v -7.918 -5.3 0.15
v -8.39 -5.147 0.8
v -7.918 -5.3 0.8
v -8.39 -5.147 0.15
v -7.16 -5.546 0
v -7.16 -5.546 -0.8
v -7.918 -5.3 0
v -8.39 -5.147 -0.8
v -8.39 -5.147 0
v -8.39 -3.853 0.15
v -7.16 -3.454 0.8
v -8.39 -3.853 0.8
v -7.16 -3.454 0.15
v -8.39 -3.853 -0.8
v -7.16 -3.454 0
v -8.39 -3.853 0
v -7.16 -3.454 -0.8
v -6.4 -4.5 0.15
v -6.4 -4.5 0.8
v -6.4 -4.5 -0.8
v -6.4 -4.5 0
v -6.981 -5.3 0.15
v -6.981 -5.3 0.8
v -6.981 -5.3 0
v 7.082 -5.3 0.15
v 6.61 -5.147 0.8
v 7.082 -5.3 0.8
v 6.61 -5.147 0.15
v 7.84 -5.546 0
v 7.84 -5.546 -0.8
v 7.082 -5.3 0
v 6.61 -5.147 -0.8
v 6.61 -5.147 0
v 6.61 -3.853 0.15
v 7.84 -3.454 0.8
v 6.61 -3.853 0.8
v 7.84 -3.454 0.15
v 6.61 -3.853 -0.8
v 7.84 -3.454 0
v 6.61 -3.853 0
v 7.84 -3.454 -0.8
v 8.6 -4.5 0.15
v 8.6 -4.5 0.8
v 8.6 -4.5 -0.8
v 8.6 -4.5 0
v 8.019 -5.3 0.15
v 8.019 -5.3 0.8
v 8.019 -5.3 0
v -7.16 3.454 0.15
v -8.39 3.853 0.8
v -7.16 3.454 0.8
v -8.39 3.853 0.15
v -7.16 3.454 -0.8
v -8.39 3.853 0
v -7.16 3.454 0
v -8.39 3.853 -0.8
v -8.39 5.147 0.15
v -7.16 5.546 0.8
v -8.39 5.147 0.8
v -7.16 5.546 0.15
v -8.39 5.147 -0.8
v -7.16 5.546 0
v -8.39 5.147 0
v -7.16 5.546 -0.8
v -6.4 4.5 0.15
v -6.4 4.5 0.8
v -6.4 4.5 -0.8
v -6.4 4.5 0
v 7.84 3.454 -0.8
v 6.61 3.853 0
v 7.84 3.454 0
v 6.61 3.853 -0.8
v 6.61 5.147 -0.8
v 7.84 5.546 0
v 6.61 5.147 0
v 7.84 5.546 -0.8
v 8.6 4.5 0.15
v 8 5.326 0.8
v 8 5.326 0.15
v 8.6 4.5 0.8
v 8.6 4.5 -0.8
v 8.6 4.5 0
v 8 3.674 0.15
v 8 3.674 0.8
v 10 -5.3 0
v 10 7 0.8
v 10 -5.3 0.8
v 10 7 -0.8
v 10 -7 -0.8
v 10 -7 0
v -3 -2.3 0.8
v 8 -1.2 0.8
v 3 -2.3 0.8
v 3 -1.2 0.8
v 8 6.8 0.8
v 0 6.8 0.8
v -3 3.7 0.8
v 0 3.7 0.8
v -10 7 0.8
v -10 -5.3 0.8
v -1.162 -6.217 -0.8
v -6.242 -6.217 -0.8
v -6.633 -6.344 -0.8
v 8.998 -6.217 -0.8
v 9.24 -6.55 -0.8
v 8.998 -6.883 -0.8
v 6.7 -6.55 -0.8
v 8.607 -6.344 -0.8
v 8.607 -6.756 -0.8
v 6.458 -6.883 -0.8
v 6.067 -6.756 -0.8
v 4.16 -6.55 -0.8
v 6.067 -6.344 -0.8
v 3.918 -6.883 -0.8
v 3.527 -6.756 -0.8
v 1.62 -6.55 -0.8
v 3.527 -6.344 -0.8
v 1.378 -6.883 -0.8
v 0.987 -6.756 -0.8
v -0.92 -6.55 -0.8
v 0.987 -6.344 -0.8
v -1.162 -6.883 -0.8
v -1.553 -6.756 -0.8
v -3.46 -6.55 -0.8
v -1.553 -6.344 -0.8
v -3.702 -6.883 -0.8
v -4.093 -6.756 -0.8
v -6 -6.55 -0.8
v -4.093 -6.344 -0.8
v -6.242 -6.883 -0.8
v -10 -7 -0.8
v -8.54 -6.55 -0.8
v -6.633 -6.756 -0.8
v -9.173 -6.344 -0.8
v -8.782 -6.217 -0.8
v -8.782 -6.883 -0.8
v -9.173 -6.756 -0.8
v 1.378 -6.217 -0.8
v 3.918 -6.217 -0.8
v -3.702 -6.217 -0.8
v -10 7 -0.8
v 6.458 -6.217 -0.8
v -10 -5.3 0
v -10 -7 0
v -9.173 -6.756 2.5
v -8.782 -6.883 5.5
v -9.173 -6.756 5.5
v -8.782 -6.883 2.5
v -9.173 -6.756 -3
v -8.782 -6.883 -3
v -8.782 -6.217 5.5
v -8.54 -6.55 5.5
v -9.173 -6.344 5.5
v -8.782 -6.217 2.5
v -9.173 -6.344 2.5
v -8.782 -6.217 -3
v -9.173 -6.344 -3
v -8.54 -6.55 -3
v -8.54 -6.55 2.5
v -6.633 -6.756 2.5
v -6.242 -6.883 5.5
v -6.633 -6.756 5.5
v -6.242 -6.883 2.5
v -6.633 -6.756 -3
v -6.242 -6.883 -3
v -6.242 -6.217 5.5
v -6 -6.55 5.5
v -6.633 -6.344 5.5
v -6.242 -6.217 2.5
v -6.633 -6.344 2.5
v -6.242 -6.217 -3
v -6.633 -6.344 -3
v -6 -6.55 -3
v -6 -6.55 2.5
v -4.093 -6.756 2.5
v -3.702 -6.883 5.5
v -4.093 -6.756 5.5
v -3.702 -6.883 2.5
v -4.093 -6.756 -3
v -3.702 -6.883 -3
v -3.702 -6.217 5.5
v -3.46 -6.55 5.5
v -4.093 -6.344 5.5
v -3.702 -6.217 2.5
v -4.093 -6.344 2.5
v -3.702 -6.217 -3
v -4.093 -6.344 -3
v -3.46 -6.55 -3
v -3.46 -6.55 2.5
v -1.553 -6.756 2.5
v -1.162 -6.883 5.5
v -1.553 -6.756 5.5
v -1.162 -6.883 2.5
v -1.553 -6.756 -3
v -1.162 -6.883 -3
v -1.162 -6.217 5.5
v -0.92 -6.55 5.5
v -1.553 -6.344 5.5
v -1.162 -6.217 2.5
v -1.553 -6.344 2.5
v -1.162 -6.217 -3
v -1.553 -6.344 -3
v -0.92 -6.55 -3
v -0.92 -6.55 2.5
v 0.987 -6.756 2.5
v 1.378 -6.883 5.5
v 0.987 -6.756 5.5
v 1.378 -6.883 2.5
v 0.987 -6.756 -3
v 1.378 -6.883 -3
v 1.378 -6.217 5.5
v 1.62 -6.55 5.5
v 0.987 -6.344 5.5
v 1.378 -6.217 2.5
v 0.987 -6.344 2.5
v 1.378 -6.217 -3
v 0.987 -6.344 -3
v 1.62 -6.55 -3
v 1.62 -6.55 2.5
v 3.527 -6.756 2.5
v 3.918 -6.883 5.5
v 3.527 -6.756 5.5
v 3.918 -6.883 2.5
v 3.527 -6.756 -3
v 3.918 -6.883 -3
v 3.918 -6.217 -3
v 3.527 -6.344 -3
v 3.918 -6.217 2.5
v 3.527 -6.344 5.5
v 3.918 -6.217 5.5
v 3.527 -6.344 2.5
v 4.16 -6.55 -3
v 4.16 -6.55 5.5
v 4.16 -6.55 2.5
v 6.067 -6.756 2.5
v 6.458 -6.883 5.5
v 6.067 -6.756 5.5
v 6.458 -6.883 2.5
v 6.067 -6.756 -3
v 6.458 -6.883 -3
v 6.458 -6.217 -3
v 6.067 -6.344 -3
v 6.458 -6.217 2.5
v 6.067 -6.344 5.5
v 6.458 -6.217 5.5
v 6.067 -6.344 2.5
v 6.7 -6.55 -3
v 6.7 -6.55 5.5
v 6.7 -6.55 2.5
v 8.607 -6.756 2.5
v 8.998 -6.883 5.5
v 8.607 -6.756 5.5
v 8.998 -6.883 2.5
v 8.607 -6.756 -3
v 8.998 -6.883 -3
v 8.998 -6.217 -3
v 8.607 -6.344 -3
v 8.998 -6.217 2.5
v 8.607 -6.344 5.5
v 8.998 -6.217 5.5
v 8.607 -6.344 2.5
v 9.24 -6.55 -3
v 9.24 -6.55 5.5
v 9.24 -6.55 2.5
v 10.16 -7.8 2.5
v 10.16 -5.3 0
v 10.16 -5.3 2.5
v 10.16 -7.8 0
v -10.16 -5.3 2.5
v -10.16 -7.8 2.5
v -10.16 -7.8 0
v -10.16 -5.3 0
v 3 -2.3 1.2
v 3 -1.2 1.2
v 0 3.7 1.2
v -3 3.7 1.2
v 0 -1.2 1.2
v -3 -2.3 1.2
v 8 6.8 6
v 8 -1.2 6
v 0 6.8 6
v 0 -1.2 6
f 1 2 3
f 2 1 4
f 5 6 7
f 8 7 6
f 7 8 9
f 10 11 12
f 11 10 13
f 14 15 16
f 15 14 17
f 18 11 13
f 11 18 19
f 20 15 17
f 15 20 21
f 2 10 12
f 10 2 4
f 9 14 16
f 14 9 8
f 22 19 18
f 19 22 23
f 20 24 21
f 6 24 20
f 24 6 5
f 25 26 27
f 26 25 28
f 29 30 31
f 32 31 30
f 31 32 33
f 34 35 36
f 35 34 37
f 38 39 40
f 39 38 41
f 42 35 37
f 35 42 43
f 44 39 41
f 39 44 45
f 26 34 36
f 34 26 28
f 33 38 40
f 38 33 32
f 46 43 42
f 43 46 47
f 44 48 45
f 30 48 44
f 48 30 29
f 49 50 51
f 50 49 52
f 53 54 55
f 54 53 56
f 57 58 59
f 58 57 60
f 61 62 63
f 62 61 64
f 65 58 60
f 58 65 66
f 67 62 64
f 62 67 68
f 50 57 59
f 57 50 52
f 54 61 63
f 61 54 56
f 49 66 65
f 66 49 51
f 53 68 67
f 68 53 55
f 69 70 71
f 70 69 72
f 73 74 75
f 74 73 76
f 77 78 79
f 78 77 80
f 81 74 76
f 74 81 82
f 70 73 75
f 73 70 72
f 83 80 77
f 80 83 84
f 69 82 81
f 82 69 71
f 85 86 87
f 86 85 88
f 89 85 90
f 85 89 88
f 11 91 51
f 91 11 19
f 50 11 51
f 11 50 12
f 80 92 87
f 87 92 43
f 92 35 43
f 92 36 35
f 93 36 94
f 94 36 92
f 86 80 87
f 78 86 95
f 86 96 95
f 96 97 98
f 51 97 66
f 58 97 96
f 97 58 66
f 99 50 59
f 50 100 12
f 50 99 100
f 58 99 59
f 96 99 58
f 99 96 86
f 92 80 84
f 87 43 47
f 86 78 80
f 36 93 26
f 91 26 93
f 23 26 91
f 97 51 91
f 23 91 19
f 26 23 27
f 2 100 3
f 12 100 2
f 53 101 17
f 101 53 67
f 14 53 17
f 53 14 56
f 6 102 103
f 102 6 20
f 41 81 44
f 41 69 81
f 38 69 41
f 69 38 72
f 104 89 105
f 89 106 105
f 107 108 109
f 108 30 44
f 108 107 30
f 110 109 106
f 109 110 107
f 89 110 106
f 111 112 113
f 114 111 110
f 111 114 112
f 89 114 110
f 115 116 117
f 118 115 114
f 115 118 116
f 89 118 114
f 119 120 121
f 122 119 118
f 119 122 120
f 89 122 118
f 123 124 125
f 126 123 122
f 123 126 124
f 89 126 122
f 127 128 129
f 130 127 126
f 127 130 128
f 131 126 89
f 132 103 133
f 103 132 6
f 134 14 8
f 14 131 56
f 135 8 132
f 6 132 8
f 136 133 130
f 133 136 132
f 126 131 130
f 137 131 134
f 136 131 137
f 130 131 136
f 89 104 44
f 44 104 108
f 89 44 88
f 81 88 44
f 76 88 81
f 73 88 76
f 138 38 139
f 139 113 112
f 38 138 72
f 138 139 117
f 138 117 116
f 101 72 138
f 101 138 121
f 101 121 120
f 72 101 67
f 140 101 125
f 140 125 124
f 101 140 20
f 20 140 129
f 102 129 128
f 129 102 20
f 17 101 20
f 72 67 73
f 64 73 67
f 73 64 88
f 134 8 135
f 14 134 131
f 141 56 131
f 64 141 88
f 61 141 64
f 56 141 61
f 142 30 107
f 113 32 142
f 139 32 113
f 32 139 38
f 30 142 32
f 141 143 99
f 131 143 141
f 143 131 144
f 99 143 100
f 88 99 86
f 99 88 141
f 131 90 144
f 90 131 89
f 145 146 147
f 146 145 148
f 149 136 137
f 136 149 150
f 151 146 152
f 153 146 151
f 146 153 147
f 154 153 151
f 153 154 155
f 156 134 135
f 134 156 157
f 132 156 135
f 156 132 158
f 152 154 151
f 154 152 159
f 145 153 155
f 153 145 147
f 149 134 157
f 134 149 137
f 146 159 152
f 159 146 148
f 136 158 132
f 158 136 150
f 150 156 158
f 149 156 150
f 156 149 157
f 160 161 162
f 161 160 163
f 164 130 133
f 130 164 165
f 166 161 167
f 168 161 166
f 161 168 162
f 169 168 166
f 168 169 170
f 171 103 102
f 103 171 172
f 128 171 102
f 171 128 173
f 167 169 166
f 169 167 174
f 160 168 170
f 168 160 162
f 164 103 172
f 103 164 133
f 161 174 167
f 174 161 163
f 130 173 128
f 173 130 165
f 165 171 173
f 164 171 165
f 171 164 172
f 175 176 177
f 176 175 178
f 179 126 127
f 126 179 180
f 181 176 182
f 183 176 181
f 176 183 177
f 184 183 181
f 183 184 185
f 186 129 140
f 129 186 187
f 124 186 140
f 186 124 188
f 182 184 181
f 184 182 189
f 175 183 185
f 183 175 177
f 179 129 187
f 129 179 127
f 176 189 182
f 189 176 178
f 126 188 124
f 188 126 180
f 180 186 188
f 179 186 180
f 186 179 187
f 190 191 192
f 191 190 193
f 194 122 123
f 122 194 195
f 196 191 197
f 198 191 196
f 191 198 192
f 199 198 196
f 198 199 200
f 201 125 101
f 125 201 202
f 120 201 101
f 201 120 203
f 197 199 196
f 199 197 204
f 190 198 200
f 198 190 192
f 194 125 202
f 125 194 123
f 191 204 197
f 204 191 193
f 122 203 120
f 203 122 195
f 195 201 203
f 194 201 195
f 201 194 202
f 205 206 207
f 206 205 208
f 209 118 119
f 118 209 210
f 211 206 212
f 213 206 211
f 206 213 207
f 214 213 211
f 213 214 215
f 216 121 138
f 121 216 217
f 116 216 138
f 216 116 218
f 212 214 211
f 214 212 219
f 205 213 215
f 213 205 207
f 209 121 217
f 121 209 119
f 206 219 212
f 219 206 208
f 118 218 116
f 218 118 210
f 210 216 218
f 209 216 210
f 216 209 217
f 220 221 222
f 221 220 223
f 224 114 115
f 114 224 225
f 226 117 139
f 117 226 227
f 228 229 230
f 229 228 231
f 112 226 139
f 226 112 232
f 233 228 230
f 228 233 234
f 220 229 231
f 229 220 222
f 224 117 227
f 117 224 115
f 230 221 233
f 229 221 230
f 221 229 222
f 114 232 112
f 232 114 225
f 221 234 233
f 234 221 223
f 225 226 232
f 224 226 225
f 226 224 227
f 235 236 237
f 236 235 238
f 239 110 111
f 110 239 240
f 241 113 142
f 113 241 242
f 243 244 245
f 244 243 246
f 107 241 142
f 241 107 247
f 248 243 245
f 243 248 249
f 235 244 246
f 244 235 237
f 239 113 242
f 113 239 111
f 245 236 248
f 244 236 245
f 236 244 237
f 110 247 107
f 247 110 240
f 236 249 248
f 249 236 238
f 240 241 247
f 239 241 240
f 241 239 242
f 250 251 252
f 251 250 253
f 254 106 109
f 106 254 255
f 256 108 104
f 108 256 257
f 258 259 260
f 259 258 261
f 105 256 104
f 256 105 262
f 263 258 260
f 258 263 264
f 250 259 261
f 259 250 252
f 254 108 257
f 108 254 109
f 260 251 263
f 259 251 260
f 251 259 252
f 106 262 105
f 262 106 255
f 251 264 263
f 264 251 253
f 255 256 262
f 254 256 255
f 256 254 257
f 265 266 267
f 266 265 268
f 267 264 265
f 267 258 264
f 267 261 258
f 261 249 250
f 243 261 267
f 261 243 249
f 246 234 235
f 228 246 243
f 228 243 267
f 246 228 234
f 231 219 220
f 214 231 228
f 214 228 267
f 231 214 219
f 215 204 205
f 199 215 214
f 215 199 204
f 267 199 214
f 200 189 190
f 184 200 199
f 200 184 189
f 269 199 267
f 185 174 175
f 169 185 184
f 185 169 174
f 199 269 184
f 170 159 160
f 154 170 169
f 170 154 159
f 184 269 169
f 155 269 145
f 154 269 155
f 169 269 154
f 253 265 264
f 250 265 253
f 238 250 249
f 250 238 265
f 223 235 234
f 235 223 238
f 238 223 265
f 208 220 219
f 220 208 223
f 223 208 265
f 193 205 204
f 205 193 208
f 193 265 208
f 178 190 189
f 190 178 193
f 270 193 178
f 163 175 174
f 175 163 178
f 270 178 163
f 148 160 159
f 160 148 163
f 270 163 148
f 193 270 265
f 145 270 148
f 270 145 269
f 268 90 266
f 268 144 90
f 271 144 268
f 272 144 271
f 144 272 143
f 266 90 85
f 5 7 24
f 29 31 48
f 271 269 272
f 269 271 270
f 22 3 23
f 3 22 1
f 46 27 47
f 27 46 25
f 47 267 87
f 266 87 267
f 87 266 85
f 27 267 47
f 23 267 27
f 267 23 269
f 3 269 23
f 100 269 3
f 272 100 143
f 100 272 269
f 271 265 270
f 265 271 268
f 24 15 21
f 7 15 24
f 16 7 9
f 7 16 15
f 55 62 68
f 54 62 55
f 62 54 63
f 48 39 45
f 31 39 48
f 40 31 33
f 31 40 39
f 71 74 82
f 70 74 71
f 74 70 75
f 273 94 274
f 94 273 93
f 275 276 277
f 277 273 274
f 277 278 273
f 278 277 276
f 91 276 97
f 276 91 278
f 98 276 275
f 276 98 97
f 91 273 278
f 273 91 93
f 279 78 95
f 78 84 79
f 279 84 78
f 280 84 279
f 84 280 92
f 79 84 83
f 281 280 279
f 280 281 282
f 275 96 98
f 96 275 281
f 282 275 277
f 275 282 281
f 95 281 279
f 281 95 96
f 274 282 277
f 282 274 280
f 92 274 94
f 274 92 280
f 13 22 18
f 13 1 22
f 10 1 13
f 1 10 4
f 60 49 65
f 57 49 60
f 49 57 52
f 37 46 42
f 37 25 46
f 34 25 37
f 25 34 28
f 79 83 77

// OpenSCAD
// Parameters
pcb_length = 20.0; //[10.0:40.0:0.5]
pcb_width = 14.0; //[7.0:28.0:0.5]
pcb_thickness = 1.6; //[0.8:3.2:0.1]
overlap = 0.8; //[0.5:2.0:0.1]
mount_hole_diameter = 2.2; //[1.6:3.6:0.1]
mount_hole_edge_margin_x = 2.5; //[1.5:5.0:0.1]
mount_hole_edge_margin_y = 2.5; //[1.5:5.0:0.1]
header_pin_pitch = 2.54; //[2.0:3.0:0.01]
header_rows = 2; //[1:2:1]
header_pins_per_row = 8; //[4:10:1]
header_plastic_height = 2.5; //[1.5:5.0:0.1]
header_plastic_thickness = 2.5; //[1.5:4.0:0.1]
header_pin_diameter = 0.7; //[0.4:1.0:0.05]
header_pin_length = 6.0; //[3.0:12.0:0.5]
ic_length = 6.0; //[3.0:12.0:0.2]
ic_width = 6.0; //[3.0:12.0:0.2]
ic_height = 1.2; //[0.6:3.0:0.1]
passive_0603_length = 1.6; //[1.0:3.2:0.1]
passive_0603_width = 0.8; //[0.5:1.6:0.05]
passive_height = 0.6; //[0.3:1.5:0.05]
heatsink_length = 8.0; //[4.0:16.0:0.5]
heatsink_width = 8.0; //[4.0:16.0:0.5]
heatsink_height = 6.0; //[3.0:12.0:0.5]
silkscreen_height = 0.15; //[0.05:0.4:0.05]
silkscreen_margin = 0.8; //[0.4:2.0:0.1]

// Geometry
module pcb_main_body() {
  color([0.0, 0.4, 0.2]) // Green PCB
  cube([pcb_length, pcb_width, pcb_thickness], center=true);
}

module mount_hole() {
  cylinder(h=pcb_thickness + 2*overlap, r=mount_hole_diameter/2, center=true);
}

module pin_header_plastic() {
  color([0.1, 0.1, 0.1]) // Black plastic
  cube([header_pin_pitch*(header_pins_per_row-1) + header_pin_pitch, header_plastic_thickness, header_plastic_height], center=true);
}

module pin_header_pin() {
  color([0.8, 0.6, 0.2]) // Brass pins
  cylinder(h=header_plastic_height + header_pin_length, r=header_pin_diameter/2, center=true);
}

module ic_package() {
  color([0.1, 0.1, 0.1]) // Black IC
  cube([ic_length, ic_width, ic_height], center=true);
}

module passive_component() {
  color([0.85, 0.85, 0.8]) // Off-white passive
  cube([passive_0603_length, passive_0603_width, passive_height], center=true);
}

module heatsink() {
  color([0.4, 0.4, 0.43]) // Steel heatsink
  cube([heatsink_length, heatsink_width, heatsink_height], center=true);
}

module silkscreen_markings() {
  color([1, 1, 1, 0.5]) // White silkscreen
  cube([pcb_length - 2*silkscreen_margin, pcb_width - 2*silkscreen_margin, silkscreen_height], center=true);
}

// Assembly
module complete_model() {
  difference() {
    pcb_main_body();
    union() {
      translate([-pcb_length/2 + mount_hole_edge_margin_x, -pcb_width/2 + mount_hole_edge_margin_y, 0]) mount_hole();
      translate([pcb_length/2 - mount_hole_edge_margin_x, -pcb_width/2 + mount_hole_edge_margin_y, 0]) mount_hole();
      translate([-pcb_length/2 + mount_hole_edge_margin_x, pcb_width/2 - mount_hole_edge_margin_y, 0]) mount_hole();
      translate([pcb_length/2 - mount_hole_edge_margin_x, pcb_width/2 - mount_hole_edge_margin_y, 0]) mount_hole();
    }
  }
  
  translate([0, -pcb_width/2 + header_plastic_thickness/2 - overlap, pcb_thickness/2 + header_plastic_height/2 - overlap])
    union() {
      pin_header_plastic();
      for (i = [0:header_pins_per_row-1]) {
        translate([-(header_pin_pitch*(header_pins_per_row-1))/2 + i*header_pin_pitch, 0, 0]) pin_header_pin();
      }
    }
  
  translate([0, pcb_width*0.05, pcb_thickness/2 + ic_height/2 - overlap]) ic_package();
  
  union() {
    translate([-pcb_length*0.25, pcb_width*0.20, pcb_thickness/2 + passive_height/2 - overlap]) passive_component();
    translate([-pcb_length*0.25 + passive_0603_length*1.2, pcb_width*0.20, pcb_thickness/2 + passive_height/2 - overlap]) passive_component();
    translate([-pcb_length*0.25, pcb_width*0.20 + passive_0603_width*1.8, pcb_thickness/2 + passive_height/2 - overlap]) passive_component();
    translate([pcb_length*0.25, pcb_width*0.15, pcb_thickness/2 + passive_height/2 - overlap]) passive_component();
  }
  
  translate([pcb_length*0.20, pcb_width*0.20, pcb_thickness/2 + heatsink_height/2 - overlap]) heatsink();
  
  translate([0, 0, pcb_thickness/2 + silkscreen_height/2 - overlap]) silkscreen_markings();
}

// Render the complete model
complete_model();
